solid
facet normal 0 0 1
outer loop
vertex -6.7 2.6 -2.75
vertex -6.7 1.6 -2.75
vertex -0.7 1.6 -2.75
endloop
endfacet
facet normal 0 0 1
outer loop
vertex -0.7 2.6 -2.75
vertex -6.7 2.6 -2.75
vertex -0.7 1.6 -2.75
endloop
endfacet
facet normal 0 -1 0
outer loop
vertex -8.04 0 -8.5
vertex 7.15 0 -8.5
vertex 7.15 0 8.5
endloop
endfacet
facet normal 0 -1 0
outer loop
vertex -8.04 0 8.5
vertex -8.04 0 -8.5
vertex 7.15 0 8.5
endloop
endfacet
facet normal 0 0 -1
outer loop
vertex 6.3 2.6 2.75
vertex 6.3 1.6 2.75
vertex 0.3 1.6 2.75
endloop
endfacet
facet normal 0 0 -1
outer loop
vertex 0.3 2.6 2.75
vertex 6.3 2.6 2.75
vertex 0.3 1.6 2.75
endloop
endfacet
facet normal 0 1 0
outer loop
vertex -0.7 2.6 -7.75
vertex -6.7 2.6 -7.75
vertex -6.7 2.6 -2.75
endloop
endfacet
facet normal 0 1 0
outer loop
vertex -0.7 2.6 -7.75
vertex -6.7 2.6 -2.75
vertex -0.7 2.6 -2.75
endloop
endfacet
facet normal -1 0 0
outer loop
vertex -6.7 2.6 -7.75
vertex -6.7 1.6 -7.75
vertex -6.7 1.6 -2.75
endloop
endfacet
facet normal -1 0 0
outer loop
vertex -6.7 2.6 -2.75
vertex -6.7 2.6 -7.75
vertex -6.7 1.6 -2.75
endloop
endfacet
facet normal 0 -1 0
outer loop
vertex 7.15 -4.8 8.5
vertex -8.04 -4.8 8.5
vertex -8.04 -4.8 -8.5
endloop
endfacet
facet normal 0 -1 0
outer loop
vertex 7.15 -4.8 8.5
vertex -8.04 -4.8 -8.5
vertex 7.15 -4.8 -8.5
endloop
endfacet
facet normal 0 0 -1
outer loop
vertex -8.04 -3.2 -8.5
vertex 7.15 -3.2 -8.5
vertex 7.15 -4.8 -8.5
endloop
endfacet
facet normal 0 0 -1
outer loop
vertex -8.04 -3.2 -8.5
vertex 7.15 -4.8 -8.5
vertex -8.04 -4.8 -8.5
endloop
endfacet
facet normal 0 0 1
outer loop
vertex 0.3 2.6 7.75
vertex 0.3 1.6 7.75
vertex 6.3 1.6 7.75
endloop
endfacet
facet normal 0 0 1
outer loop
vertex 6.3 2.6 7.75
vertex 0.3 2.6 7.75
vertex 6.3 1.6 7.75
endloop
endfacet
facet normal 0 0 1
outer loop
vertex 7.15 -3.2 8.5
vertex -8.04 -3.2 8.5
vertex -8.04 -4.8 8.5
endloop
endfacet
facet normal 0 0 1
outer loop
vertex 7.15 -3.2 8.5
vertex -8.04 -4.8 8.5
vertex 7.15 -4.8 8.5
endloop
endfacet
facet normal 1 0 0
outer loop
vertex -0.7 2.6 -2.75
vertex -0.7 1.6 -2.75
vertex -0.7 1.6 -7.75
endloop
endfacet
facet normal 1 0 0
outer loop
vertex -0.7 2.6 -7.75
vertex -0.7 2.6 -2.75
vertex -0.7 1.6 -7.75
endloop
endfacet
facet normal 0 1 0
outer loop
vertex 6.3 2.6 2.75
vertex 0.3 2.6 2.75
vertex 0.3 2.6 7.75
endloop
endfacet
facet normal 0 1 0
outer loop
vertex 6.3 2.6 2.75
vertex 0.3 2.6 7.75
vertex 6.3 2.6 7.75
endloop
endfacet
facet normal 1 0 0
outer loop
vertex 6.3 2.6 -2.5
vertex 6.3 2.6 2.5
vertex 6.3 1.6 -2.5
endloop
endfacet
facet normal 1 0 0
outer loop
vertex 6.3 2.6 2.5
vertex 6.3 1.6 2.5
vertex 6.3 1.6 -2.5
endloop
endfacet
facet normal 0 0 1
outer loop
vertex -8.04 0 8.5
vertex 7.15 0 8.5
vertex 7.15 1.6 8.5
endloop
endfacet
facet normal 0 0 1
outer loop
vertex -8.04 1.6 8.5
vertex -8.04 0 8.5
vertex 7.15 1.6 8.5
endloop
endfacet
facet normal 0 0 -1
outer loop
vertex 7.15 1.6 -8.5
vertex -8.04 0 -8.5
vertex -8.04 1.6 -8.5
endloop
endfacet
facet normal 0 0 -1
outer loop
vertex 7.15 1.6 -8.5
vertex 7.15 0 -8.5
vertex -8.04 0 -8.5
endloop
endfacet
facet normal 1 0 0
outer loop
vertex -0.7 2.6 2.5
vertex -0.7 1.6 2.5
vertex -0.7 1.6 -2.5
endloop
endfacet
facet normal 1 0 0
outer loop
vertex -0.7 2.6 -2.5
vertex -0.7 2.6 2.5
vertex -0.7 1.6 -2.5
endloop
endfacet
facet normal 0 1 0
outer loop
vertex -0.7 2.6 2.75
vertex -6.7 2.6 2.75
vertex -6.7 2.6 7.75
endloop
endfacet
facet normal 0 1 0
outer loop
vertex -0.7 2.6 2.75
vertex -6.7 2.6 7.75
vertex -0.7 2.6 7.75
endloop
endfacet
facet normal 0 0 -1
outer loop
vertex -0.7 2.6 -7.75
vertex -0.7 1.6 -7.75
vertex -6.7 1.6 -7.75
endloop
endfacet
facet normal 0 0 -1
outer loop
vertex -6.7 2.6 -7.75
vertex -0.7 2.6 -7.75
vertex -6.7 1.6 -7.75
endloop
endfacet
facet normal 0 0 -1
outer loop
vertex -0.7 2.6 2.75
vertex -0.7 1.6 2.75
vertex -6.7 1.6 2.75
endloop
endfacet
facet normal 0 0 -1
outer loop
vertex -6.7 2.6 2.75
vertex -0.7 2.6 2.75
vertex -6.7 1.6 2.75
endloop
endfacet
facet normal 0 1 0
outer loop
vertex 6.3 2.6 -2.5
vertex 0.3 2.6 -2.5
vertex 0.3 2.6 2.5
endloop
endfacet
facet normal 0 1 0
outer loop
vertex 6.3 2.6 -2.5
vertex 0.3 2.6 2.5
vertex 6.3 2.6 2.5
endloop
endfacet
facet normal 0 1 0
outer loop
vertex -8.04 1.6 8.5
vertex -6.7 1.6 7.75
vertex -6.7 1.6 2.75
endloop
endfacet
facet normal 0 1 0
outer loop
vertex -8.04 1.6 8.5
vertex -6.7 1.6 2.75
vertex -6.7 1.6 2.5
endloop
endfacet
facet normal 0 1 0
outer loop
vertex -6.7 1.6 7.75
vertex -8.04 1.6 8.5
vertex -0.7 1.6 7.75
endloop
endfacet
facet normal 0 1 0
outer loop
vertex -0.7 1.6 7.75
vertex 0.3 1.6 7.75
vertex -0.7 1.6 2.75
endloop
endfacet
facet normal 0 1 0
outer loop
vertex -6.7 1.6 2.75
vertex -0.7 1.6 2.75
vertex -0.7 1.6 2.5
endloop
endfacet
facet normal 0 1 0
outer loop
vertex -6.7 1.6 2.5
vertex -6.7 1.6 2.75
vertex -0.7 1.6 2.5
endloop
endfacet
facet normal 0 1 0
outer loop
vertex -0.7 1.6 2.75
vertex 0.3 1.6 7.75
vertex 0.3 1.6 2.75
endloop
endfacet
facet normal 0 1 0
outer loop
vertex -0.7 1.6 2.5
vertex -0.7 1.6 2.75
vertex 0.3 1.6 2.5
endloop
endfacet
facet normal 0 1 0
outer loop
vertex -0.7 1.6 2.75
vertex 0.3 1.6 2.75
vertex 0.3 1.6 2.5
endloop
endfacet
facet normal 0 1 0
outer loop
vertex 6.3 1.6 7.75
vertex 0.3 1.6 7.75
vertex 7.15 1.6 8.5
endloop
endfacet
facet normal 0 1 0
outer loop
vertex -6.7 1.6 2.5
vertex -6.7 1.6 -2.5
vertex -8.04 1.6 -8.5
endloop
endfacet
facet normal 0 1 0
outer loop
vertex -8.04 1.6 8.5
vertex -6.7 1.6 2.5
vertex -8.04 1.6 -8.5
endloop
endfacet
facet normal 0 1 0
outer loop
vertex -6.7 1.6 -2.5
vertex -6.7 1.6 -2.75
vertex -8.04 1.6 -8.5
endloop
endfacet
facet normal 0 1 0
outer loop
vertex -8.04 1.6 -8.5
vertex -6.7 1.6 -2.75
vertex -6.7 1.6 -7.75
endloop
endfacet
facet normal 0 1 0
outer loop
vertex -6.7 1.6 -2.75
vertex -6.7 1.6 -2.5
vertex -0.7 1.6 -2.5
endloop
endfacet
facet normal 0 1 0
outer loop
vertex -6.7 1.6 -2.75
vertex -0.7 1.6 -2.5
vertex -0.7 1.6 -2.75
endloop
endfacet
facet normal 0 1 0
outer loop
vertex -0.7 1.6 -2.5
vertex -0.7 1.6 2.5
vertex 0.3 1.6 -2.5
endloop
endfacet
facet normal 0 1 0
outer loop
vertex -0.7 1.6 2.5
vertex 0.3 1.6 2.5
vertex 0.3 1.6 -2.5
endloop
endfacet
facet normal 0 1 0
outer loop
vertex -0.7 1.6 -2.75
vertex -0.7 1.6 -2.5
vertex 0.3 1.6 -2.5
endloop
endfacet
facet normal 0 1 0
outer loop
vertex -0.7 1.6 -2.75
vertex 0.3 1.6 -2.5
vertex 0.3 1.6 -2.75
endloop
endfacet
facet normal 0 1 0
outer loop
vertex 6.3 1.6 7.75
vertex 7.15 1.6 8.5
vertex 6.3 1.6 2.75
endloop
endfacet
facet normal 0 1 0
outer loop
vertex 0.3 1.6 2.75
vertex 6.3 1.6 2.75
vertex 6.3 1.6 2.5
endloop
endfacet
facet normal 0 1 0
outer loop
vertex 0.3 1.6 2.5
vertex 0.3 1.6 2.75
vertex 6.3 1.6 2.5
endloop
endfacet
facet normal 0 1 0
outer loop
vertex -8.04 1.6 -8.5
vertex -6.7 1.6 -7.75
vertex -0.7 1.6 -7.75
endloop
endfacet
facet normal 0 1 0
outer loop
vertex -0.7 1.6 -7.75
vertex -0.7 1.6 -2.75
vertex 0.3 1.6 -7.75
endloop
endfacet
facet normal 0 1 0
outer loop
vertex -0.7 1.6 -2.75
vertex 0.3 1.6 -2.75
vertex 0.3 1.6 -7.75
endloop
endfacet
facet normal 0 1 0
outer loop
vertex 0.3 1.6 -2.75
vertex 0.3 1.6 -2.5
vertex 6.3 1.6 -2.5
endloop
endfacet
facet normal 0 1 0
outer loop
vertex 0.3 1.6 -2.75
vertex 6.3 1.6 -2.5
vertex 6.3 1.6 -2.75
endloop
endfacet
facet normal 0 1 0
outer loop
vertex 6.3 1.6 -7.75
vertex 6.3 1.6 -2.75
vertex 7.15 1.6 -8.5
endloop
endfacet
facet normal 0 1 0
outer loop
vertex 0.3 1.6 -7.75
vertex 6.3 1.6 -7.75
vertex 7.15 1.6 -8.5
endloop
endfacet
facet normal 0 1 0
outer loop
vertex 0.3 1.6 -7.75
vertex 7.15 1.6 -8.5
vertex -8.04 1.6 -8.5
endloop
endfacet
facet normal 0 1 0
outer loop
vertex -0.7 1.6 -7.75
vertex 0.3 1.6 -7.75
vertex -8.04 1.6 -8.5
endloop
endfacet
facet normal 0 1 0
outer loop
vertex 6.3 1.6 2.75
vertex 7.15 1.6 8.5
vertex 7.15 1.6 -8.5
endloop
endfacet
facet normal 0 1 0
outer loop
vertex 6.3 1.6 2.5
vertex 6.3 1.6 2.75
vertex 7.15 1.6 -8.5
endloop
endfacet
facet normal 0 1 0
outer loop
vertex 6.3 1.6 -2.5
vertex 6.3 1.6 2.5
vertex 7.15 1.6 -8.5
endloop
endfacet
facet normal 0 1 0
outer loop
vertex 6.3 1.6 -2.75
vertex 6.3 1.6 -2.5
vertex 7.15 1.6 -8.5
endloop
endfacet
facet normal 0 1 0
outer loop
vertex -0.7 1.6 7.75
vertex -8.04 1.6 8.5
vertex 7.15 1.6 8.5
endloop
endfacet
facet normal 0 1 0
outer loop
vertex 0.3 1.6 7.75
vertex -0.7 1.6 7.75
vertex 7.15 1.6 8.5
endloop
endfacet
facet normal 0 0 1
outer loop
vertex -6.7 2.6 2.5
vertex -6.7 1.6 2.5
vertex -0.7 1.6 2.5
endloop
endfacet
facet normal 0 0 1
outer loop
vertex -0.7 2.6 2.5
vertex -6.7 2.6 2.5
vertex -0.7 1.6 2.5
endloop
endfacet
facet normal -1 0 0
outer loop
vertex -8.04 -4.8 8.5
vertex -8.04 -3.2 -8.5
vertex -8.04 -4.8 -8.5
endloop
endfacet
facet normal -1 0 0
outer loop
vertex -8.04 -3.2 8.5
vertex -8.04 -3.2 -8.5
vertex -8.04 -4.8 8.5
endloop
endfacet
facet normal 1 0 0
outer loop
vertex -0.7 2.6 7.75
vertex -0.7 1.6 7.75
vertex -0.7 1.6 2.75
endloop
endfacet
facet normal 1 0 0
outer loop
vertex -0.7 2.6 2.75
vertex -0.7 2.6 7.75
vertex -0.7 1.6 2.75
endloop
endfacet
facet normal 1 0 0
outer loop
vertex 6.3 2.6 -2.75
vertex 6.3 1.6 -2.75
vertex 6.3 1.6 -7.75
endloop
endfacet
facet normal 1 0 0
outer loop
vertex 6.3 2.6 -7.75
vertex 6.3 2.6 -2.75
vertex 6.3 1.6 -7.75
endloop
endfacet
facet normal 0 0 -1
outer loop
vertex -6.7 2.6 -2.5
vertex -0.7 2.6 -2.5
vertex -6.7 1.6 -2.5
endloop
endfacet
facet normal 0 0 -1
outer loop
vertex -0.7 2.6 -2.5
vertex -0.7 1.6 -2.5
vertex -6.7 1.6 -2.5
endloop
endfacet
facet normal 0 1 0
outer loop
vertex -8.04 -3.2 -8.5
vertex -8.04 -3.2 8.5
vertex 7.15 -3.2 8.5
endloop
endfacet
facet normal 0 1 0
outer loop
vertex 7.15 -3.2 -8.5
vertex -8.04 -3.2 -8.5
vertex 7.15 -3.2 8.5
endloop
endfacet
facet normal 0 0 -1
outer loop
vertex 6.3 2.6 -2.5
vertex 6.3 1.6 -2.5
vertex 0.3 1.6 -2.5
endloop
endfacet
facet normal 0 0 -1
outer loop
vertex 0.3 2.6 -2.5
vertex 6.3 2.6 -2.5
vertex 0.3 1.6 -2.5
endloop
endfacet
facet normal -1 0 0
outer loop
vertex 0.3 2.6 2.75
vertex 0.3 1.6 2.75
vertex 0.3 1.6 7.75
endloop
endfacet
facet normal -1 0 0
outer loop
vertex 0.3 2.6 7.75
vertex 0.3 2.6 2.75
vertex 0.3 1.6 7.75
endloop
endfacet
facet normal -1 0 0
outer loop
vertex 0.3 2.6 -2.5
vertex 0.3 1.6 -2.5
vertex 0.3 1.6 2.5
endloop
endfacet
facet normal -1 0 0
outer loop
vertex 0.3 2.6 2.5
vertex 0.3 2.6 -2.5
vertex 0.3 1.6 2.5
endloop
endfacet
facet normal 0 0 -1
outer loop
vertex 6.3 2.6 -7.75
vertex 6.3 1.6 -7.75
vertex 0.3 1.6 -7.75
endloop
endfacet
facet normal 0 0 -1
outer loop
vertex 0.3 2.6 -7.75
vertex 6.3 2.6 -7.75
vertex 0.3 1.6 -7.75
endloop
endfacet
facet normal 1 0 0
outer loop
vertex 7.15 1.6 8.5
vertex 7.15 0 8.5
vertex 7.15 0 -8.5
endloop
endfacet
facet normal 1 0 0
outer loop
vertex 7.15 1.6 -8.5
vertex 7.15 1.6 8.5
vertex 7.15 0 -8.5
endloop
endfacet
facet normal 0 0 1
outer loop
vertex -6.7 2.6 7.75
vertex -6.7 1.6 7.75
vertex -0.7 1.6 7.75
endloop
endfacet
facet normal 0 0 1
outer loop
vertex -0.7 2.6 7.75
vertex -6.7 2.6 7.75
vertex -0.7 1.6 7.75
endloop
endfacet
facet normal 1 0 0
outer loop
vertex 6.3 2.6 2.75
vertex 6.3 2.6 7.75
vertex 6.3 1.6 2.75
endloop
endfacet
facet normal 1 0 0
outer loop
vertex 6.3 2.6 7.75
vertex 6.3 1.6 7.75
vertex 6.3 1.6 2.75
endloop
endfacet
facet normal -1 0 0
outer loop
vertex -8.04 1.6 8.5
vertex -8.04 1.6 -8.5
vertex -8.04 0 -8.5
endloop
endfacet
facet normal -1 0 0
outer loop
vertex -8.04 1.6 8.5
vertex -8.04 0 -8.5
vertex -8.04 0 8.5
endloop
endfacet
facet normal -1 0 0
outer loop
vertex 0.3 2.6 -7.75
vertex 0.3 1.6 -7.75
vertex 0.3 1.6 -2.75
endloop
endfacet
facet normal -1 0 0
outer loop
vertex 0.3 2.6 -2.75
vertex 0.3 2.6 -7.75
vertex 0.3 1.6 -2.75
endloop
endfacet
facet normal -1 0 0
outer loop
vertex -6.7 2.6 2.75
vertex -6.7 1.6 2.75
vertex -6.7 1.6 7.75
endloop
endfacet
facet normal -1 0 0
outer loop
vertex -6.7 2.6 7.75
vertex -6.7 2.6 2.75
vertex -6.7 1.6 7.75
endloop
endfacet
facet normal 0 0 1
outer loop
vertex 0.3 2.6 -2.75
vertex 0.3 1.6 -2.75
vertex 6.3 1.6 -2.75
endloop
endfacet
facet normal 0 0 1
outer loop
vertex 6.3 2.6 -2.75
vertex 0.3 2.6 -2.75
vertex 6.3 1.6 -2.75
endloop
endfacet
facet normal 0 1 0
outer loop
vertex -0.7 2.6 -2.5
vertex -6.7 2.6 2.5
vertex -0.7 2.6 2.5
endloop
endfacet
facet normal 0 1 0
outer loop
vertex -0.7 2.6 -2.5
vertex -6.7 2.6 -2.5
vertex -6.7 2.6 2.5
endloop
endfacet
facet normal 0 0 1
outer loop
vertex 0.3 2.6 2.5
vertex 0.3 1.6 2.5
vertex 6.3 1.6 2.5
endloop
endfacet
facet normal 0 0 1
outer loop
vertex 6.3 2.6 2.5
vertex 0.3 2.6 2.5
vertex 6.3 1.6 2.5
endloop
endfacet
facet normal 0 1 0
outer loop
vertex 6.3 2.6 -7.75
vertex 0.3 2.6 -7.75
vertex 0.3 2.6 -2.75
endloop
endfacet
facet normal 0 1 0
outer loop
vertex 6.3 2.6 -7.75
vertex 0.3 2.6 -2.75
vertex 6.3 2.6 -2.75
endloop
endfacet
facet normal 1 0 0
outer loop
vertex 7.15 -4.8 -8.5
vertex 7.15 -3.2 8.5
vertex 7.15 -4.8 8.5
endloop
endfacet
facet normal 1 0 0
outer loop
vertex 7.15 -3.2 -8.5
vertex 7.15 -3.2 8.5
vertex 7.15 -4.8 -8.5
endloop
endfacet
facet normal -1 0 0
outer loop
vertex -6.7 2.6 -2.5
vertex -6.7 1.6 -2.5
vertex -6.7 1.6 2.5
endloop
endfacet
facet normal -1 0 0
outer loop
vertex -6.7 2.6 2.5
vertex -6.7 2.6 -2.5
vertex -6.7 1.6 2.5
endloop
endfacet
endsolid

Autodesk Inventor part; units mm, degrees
ref_plane "YZ Plane" through (0, 0, 0) normal (1, 0, 0) x (0, 1, 0)
ref_plane "XZ Plane" through (0, 0, 0) normal (0, 1, 0) x (-1, 0, 0)
ref_plane "XY Plane" through (0, 0, 0) normal (0, 0, 1) x (1, 0, 0)
sketch "Sketch1" plane through (0, 0, 0) normal (0, 1, 0) x (-1, 0, 0)
  line L0 (7.15, 8.5) -> (-7.15, 8.5)
  line L1 (-7.15, 8.5) -> (-7.15, -8.5)
  line L2 (-7.15, -8.5) -> (7.15, -8.5)
  line L3 (7.15, -8.5) -> (7.15, 8.5)
  point P0 (0, 0)
  dimension "d0" = 17
  dimension "d1" = 14.3
  dimension "d2" = 8.5
  dimension "d3" = 7.15
extrude "Extrusion1" add sketch "Sketch1" along normal blind 1.6
sketch "Sketch2" plane through (0, 1.6, 0) normal (0, 1, 0) x (1, 0, 0)
  line L0 (-6.7, -7.75) -> (-0.7, -7.75)
  line L1 (-0.7, -7.75) -> (-0.7, -2.75)
  line L2 (-0.7, -2.75) -> (-6.7, -2.75)
  line L3 (-6.7, -2.75) -> (-6.7, -7.75)
  line L4 (-6.7, -2.5) -> (-0.7, -2.5)
  line L5 (-0.7, -2.5) -> (-0.7, 2.5)
  line L6 (-0.7, 2.5) -> (-6.7, 2.5)
  line L7 (-6.7, 2.5) -> (-6.7, -2.5)
  line L8 (-6.7, 2.75) -> (-0.7, 2.75)
  line L9 (-0.7, 2.75) -> (-0.7, 7.75)
  line L10 (-0.7, 7.75) -> (-6.7, 7.75)
  line L11 (-6.7, 7.75) -> (-6.7, 2.75)
  line L12 (-7.15, -8.5) -> (7.15, -8.5) projected
  line L13 (0.3, -7.75) -> (6.3, -7.75)
  line L14 (6.3, -7.75) -> (6.3, -2.75)
  line L15 (6.3, -2.75) -> (0.3, -2.75)
  line L16 (0.3, -2.75) -> (0.3, -7.75)
  line L17 (0.3, -2.5) -> (6.3, -2.5)
  line L18 (6.3, -2.5) -> (6.3, 2.5)
  line L19 (6.3, 2.5) -> (0.3, 2.5)
  line L20 (0.3, 2.5) -> (0.3, -2.5)
  line L21 (0.3, 2.75) -> (6.3, 2.75)
  line L22 (6.3, 2.75) -> (6.3, 7.75)
  line L23 (6.3, 7.75) -> (0.3, 7.75)
  line L24 (0.3, 7.75) -> (0.3, 2.75)
  line L25 (-7.15, 8.5) -> (-7.15, -8.5) projected
  point P0 (0, 0)
  dimension "d6" = 5
  dimension "d7" = 6
  dimension "d8" = 5
  dimension "d9" = 5
  dimension "d10" = 0.25
  dimension "d11" = 0.25
  dimension "d12" = 0.75
  dimension "d13" = 5
  dimension "d14" = 5
  dimension "d15" = 5
  dimension "d16" = 6
  dimension "d17" = 6
  dimension "d18" = 6
  dimension "d19" = 0.25
  dimension "d20" = 0.25
  dimension "d21" = 1
  dimension "d22" = 0.45
extrude "Extrusion2" add sketch "Sketch2" along normal blind 1
ref_plane "Work Plane1" through (0, -3.2, 0) normal (0, -1, 0) x (1, 0, 0)
sketch "Sketch3" plane through (0, -3.2, 0) normal (0, -1, 0) x (1, 0, 0)
  line L0 (7.15, 8.5) -> (7.15, -8.5) projected
  line L1 (-7.15, -8.5) -> (-7.15, 8.5) projected
  line L2 (7.15, -8.5) -> (-7.15, -8.5)
  line L3 (-7.15, -8.5) -> (-7.15, 8.5)
  line L4 (-7.15, 8.5) -> (7.15, 8.5)
  line L5 (7.15, 8.5) -> (7.15, -8.5)
  point P0 (0, 0)
extrude "Extrusion3" add sketch "Sketch3" along normal blind 1.6
ref_plane "Work Plane2" through (0, -6.3, 0) normal (0, -1, 0) x (1, 0, 0)
sketch "Sketch4" plane through (-7.15, 0, -8.5) normal (-1, 0, 0) x (0, 0, 1)
  line L0 (0, 0) -> (0, 1.6) projected
  line L1 (17, 0) -> (17, 1.6) projected
  line L2 (0, 0) -> (17, 0)
  line L3 (17, 0) -> (17, 1.6)
  line L4 (17, 1.6) -> (0, 1.6)
  line L5 (0, 1.6) -> (0, 0)
  point P0 (8.5, 0)
extrude "Extrusion4" add sketch "Sketch4" along normal blind 0.89
sketch "Sketch5" plane through (-7.15, -3.2, -8.5) normal (-1, 0, 0) x (0, 0, 1)
  line L0 (0, 0) -> (0, -1.6) projected
  line L1 (0, -1.6) -> (17, -1.6)
  line L2 (17, -1.6) -> (17, 0)
  line L3 (17, 0) -> (0, 0)
  line L4 (0, 0) -> (0, -1.6)
  point P0 (8.5, 3.2)
extrude "Extrusion5" add sketch "Sketch5" along normal blind 0.89
properties part number "UberV2"
